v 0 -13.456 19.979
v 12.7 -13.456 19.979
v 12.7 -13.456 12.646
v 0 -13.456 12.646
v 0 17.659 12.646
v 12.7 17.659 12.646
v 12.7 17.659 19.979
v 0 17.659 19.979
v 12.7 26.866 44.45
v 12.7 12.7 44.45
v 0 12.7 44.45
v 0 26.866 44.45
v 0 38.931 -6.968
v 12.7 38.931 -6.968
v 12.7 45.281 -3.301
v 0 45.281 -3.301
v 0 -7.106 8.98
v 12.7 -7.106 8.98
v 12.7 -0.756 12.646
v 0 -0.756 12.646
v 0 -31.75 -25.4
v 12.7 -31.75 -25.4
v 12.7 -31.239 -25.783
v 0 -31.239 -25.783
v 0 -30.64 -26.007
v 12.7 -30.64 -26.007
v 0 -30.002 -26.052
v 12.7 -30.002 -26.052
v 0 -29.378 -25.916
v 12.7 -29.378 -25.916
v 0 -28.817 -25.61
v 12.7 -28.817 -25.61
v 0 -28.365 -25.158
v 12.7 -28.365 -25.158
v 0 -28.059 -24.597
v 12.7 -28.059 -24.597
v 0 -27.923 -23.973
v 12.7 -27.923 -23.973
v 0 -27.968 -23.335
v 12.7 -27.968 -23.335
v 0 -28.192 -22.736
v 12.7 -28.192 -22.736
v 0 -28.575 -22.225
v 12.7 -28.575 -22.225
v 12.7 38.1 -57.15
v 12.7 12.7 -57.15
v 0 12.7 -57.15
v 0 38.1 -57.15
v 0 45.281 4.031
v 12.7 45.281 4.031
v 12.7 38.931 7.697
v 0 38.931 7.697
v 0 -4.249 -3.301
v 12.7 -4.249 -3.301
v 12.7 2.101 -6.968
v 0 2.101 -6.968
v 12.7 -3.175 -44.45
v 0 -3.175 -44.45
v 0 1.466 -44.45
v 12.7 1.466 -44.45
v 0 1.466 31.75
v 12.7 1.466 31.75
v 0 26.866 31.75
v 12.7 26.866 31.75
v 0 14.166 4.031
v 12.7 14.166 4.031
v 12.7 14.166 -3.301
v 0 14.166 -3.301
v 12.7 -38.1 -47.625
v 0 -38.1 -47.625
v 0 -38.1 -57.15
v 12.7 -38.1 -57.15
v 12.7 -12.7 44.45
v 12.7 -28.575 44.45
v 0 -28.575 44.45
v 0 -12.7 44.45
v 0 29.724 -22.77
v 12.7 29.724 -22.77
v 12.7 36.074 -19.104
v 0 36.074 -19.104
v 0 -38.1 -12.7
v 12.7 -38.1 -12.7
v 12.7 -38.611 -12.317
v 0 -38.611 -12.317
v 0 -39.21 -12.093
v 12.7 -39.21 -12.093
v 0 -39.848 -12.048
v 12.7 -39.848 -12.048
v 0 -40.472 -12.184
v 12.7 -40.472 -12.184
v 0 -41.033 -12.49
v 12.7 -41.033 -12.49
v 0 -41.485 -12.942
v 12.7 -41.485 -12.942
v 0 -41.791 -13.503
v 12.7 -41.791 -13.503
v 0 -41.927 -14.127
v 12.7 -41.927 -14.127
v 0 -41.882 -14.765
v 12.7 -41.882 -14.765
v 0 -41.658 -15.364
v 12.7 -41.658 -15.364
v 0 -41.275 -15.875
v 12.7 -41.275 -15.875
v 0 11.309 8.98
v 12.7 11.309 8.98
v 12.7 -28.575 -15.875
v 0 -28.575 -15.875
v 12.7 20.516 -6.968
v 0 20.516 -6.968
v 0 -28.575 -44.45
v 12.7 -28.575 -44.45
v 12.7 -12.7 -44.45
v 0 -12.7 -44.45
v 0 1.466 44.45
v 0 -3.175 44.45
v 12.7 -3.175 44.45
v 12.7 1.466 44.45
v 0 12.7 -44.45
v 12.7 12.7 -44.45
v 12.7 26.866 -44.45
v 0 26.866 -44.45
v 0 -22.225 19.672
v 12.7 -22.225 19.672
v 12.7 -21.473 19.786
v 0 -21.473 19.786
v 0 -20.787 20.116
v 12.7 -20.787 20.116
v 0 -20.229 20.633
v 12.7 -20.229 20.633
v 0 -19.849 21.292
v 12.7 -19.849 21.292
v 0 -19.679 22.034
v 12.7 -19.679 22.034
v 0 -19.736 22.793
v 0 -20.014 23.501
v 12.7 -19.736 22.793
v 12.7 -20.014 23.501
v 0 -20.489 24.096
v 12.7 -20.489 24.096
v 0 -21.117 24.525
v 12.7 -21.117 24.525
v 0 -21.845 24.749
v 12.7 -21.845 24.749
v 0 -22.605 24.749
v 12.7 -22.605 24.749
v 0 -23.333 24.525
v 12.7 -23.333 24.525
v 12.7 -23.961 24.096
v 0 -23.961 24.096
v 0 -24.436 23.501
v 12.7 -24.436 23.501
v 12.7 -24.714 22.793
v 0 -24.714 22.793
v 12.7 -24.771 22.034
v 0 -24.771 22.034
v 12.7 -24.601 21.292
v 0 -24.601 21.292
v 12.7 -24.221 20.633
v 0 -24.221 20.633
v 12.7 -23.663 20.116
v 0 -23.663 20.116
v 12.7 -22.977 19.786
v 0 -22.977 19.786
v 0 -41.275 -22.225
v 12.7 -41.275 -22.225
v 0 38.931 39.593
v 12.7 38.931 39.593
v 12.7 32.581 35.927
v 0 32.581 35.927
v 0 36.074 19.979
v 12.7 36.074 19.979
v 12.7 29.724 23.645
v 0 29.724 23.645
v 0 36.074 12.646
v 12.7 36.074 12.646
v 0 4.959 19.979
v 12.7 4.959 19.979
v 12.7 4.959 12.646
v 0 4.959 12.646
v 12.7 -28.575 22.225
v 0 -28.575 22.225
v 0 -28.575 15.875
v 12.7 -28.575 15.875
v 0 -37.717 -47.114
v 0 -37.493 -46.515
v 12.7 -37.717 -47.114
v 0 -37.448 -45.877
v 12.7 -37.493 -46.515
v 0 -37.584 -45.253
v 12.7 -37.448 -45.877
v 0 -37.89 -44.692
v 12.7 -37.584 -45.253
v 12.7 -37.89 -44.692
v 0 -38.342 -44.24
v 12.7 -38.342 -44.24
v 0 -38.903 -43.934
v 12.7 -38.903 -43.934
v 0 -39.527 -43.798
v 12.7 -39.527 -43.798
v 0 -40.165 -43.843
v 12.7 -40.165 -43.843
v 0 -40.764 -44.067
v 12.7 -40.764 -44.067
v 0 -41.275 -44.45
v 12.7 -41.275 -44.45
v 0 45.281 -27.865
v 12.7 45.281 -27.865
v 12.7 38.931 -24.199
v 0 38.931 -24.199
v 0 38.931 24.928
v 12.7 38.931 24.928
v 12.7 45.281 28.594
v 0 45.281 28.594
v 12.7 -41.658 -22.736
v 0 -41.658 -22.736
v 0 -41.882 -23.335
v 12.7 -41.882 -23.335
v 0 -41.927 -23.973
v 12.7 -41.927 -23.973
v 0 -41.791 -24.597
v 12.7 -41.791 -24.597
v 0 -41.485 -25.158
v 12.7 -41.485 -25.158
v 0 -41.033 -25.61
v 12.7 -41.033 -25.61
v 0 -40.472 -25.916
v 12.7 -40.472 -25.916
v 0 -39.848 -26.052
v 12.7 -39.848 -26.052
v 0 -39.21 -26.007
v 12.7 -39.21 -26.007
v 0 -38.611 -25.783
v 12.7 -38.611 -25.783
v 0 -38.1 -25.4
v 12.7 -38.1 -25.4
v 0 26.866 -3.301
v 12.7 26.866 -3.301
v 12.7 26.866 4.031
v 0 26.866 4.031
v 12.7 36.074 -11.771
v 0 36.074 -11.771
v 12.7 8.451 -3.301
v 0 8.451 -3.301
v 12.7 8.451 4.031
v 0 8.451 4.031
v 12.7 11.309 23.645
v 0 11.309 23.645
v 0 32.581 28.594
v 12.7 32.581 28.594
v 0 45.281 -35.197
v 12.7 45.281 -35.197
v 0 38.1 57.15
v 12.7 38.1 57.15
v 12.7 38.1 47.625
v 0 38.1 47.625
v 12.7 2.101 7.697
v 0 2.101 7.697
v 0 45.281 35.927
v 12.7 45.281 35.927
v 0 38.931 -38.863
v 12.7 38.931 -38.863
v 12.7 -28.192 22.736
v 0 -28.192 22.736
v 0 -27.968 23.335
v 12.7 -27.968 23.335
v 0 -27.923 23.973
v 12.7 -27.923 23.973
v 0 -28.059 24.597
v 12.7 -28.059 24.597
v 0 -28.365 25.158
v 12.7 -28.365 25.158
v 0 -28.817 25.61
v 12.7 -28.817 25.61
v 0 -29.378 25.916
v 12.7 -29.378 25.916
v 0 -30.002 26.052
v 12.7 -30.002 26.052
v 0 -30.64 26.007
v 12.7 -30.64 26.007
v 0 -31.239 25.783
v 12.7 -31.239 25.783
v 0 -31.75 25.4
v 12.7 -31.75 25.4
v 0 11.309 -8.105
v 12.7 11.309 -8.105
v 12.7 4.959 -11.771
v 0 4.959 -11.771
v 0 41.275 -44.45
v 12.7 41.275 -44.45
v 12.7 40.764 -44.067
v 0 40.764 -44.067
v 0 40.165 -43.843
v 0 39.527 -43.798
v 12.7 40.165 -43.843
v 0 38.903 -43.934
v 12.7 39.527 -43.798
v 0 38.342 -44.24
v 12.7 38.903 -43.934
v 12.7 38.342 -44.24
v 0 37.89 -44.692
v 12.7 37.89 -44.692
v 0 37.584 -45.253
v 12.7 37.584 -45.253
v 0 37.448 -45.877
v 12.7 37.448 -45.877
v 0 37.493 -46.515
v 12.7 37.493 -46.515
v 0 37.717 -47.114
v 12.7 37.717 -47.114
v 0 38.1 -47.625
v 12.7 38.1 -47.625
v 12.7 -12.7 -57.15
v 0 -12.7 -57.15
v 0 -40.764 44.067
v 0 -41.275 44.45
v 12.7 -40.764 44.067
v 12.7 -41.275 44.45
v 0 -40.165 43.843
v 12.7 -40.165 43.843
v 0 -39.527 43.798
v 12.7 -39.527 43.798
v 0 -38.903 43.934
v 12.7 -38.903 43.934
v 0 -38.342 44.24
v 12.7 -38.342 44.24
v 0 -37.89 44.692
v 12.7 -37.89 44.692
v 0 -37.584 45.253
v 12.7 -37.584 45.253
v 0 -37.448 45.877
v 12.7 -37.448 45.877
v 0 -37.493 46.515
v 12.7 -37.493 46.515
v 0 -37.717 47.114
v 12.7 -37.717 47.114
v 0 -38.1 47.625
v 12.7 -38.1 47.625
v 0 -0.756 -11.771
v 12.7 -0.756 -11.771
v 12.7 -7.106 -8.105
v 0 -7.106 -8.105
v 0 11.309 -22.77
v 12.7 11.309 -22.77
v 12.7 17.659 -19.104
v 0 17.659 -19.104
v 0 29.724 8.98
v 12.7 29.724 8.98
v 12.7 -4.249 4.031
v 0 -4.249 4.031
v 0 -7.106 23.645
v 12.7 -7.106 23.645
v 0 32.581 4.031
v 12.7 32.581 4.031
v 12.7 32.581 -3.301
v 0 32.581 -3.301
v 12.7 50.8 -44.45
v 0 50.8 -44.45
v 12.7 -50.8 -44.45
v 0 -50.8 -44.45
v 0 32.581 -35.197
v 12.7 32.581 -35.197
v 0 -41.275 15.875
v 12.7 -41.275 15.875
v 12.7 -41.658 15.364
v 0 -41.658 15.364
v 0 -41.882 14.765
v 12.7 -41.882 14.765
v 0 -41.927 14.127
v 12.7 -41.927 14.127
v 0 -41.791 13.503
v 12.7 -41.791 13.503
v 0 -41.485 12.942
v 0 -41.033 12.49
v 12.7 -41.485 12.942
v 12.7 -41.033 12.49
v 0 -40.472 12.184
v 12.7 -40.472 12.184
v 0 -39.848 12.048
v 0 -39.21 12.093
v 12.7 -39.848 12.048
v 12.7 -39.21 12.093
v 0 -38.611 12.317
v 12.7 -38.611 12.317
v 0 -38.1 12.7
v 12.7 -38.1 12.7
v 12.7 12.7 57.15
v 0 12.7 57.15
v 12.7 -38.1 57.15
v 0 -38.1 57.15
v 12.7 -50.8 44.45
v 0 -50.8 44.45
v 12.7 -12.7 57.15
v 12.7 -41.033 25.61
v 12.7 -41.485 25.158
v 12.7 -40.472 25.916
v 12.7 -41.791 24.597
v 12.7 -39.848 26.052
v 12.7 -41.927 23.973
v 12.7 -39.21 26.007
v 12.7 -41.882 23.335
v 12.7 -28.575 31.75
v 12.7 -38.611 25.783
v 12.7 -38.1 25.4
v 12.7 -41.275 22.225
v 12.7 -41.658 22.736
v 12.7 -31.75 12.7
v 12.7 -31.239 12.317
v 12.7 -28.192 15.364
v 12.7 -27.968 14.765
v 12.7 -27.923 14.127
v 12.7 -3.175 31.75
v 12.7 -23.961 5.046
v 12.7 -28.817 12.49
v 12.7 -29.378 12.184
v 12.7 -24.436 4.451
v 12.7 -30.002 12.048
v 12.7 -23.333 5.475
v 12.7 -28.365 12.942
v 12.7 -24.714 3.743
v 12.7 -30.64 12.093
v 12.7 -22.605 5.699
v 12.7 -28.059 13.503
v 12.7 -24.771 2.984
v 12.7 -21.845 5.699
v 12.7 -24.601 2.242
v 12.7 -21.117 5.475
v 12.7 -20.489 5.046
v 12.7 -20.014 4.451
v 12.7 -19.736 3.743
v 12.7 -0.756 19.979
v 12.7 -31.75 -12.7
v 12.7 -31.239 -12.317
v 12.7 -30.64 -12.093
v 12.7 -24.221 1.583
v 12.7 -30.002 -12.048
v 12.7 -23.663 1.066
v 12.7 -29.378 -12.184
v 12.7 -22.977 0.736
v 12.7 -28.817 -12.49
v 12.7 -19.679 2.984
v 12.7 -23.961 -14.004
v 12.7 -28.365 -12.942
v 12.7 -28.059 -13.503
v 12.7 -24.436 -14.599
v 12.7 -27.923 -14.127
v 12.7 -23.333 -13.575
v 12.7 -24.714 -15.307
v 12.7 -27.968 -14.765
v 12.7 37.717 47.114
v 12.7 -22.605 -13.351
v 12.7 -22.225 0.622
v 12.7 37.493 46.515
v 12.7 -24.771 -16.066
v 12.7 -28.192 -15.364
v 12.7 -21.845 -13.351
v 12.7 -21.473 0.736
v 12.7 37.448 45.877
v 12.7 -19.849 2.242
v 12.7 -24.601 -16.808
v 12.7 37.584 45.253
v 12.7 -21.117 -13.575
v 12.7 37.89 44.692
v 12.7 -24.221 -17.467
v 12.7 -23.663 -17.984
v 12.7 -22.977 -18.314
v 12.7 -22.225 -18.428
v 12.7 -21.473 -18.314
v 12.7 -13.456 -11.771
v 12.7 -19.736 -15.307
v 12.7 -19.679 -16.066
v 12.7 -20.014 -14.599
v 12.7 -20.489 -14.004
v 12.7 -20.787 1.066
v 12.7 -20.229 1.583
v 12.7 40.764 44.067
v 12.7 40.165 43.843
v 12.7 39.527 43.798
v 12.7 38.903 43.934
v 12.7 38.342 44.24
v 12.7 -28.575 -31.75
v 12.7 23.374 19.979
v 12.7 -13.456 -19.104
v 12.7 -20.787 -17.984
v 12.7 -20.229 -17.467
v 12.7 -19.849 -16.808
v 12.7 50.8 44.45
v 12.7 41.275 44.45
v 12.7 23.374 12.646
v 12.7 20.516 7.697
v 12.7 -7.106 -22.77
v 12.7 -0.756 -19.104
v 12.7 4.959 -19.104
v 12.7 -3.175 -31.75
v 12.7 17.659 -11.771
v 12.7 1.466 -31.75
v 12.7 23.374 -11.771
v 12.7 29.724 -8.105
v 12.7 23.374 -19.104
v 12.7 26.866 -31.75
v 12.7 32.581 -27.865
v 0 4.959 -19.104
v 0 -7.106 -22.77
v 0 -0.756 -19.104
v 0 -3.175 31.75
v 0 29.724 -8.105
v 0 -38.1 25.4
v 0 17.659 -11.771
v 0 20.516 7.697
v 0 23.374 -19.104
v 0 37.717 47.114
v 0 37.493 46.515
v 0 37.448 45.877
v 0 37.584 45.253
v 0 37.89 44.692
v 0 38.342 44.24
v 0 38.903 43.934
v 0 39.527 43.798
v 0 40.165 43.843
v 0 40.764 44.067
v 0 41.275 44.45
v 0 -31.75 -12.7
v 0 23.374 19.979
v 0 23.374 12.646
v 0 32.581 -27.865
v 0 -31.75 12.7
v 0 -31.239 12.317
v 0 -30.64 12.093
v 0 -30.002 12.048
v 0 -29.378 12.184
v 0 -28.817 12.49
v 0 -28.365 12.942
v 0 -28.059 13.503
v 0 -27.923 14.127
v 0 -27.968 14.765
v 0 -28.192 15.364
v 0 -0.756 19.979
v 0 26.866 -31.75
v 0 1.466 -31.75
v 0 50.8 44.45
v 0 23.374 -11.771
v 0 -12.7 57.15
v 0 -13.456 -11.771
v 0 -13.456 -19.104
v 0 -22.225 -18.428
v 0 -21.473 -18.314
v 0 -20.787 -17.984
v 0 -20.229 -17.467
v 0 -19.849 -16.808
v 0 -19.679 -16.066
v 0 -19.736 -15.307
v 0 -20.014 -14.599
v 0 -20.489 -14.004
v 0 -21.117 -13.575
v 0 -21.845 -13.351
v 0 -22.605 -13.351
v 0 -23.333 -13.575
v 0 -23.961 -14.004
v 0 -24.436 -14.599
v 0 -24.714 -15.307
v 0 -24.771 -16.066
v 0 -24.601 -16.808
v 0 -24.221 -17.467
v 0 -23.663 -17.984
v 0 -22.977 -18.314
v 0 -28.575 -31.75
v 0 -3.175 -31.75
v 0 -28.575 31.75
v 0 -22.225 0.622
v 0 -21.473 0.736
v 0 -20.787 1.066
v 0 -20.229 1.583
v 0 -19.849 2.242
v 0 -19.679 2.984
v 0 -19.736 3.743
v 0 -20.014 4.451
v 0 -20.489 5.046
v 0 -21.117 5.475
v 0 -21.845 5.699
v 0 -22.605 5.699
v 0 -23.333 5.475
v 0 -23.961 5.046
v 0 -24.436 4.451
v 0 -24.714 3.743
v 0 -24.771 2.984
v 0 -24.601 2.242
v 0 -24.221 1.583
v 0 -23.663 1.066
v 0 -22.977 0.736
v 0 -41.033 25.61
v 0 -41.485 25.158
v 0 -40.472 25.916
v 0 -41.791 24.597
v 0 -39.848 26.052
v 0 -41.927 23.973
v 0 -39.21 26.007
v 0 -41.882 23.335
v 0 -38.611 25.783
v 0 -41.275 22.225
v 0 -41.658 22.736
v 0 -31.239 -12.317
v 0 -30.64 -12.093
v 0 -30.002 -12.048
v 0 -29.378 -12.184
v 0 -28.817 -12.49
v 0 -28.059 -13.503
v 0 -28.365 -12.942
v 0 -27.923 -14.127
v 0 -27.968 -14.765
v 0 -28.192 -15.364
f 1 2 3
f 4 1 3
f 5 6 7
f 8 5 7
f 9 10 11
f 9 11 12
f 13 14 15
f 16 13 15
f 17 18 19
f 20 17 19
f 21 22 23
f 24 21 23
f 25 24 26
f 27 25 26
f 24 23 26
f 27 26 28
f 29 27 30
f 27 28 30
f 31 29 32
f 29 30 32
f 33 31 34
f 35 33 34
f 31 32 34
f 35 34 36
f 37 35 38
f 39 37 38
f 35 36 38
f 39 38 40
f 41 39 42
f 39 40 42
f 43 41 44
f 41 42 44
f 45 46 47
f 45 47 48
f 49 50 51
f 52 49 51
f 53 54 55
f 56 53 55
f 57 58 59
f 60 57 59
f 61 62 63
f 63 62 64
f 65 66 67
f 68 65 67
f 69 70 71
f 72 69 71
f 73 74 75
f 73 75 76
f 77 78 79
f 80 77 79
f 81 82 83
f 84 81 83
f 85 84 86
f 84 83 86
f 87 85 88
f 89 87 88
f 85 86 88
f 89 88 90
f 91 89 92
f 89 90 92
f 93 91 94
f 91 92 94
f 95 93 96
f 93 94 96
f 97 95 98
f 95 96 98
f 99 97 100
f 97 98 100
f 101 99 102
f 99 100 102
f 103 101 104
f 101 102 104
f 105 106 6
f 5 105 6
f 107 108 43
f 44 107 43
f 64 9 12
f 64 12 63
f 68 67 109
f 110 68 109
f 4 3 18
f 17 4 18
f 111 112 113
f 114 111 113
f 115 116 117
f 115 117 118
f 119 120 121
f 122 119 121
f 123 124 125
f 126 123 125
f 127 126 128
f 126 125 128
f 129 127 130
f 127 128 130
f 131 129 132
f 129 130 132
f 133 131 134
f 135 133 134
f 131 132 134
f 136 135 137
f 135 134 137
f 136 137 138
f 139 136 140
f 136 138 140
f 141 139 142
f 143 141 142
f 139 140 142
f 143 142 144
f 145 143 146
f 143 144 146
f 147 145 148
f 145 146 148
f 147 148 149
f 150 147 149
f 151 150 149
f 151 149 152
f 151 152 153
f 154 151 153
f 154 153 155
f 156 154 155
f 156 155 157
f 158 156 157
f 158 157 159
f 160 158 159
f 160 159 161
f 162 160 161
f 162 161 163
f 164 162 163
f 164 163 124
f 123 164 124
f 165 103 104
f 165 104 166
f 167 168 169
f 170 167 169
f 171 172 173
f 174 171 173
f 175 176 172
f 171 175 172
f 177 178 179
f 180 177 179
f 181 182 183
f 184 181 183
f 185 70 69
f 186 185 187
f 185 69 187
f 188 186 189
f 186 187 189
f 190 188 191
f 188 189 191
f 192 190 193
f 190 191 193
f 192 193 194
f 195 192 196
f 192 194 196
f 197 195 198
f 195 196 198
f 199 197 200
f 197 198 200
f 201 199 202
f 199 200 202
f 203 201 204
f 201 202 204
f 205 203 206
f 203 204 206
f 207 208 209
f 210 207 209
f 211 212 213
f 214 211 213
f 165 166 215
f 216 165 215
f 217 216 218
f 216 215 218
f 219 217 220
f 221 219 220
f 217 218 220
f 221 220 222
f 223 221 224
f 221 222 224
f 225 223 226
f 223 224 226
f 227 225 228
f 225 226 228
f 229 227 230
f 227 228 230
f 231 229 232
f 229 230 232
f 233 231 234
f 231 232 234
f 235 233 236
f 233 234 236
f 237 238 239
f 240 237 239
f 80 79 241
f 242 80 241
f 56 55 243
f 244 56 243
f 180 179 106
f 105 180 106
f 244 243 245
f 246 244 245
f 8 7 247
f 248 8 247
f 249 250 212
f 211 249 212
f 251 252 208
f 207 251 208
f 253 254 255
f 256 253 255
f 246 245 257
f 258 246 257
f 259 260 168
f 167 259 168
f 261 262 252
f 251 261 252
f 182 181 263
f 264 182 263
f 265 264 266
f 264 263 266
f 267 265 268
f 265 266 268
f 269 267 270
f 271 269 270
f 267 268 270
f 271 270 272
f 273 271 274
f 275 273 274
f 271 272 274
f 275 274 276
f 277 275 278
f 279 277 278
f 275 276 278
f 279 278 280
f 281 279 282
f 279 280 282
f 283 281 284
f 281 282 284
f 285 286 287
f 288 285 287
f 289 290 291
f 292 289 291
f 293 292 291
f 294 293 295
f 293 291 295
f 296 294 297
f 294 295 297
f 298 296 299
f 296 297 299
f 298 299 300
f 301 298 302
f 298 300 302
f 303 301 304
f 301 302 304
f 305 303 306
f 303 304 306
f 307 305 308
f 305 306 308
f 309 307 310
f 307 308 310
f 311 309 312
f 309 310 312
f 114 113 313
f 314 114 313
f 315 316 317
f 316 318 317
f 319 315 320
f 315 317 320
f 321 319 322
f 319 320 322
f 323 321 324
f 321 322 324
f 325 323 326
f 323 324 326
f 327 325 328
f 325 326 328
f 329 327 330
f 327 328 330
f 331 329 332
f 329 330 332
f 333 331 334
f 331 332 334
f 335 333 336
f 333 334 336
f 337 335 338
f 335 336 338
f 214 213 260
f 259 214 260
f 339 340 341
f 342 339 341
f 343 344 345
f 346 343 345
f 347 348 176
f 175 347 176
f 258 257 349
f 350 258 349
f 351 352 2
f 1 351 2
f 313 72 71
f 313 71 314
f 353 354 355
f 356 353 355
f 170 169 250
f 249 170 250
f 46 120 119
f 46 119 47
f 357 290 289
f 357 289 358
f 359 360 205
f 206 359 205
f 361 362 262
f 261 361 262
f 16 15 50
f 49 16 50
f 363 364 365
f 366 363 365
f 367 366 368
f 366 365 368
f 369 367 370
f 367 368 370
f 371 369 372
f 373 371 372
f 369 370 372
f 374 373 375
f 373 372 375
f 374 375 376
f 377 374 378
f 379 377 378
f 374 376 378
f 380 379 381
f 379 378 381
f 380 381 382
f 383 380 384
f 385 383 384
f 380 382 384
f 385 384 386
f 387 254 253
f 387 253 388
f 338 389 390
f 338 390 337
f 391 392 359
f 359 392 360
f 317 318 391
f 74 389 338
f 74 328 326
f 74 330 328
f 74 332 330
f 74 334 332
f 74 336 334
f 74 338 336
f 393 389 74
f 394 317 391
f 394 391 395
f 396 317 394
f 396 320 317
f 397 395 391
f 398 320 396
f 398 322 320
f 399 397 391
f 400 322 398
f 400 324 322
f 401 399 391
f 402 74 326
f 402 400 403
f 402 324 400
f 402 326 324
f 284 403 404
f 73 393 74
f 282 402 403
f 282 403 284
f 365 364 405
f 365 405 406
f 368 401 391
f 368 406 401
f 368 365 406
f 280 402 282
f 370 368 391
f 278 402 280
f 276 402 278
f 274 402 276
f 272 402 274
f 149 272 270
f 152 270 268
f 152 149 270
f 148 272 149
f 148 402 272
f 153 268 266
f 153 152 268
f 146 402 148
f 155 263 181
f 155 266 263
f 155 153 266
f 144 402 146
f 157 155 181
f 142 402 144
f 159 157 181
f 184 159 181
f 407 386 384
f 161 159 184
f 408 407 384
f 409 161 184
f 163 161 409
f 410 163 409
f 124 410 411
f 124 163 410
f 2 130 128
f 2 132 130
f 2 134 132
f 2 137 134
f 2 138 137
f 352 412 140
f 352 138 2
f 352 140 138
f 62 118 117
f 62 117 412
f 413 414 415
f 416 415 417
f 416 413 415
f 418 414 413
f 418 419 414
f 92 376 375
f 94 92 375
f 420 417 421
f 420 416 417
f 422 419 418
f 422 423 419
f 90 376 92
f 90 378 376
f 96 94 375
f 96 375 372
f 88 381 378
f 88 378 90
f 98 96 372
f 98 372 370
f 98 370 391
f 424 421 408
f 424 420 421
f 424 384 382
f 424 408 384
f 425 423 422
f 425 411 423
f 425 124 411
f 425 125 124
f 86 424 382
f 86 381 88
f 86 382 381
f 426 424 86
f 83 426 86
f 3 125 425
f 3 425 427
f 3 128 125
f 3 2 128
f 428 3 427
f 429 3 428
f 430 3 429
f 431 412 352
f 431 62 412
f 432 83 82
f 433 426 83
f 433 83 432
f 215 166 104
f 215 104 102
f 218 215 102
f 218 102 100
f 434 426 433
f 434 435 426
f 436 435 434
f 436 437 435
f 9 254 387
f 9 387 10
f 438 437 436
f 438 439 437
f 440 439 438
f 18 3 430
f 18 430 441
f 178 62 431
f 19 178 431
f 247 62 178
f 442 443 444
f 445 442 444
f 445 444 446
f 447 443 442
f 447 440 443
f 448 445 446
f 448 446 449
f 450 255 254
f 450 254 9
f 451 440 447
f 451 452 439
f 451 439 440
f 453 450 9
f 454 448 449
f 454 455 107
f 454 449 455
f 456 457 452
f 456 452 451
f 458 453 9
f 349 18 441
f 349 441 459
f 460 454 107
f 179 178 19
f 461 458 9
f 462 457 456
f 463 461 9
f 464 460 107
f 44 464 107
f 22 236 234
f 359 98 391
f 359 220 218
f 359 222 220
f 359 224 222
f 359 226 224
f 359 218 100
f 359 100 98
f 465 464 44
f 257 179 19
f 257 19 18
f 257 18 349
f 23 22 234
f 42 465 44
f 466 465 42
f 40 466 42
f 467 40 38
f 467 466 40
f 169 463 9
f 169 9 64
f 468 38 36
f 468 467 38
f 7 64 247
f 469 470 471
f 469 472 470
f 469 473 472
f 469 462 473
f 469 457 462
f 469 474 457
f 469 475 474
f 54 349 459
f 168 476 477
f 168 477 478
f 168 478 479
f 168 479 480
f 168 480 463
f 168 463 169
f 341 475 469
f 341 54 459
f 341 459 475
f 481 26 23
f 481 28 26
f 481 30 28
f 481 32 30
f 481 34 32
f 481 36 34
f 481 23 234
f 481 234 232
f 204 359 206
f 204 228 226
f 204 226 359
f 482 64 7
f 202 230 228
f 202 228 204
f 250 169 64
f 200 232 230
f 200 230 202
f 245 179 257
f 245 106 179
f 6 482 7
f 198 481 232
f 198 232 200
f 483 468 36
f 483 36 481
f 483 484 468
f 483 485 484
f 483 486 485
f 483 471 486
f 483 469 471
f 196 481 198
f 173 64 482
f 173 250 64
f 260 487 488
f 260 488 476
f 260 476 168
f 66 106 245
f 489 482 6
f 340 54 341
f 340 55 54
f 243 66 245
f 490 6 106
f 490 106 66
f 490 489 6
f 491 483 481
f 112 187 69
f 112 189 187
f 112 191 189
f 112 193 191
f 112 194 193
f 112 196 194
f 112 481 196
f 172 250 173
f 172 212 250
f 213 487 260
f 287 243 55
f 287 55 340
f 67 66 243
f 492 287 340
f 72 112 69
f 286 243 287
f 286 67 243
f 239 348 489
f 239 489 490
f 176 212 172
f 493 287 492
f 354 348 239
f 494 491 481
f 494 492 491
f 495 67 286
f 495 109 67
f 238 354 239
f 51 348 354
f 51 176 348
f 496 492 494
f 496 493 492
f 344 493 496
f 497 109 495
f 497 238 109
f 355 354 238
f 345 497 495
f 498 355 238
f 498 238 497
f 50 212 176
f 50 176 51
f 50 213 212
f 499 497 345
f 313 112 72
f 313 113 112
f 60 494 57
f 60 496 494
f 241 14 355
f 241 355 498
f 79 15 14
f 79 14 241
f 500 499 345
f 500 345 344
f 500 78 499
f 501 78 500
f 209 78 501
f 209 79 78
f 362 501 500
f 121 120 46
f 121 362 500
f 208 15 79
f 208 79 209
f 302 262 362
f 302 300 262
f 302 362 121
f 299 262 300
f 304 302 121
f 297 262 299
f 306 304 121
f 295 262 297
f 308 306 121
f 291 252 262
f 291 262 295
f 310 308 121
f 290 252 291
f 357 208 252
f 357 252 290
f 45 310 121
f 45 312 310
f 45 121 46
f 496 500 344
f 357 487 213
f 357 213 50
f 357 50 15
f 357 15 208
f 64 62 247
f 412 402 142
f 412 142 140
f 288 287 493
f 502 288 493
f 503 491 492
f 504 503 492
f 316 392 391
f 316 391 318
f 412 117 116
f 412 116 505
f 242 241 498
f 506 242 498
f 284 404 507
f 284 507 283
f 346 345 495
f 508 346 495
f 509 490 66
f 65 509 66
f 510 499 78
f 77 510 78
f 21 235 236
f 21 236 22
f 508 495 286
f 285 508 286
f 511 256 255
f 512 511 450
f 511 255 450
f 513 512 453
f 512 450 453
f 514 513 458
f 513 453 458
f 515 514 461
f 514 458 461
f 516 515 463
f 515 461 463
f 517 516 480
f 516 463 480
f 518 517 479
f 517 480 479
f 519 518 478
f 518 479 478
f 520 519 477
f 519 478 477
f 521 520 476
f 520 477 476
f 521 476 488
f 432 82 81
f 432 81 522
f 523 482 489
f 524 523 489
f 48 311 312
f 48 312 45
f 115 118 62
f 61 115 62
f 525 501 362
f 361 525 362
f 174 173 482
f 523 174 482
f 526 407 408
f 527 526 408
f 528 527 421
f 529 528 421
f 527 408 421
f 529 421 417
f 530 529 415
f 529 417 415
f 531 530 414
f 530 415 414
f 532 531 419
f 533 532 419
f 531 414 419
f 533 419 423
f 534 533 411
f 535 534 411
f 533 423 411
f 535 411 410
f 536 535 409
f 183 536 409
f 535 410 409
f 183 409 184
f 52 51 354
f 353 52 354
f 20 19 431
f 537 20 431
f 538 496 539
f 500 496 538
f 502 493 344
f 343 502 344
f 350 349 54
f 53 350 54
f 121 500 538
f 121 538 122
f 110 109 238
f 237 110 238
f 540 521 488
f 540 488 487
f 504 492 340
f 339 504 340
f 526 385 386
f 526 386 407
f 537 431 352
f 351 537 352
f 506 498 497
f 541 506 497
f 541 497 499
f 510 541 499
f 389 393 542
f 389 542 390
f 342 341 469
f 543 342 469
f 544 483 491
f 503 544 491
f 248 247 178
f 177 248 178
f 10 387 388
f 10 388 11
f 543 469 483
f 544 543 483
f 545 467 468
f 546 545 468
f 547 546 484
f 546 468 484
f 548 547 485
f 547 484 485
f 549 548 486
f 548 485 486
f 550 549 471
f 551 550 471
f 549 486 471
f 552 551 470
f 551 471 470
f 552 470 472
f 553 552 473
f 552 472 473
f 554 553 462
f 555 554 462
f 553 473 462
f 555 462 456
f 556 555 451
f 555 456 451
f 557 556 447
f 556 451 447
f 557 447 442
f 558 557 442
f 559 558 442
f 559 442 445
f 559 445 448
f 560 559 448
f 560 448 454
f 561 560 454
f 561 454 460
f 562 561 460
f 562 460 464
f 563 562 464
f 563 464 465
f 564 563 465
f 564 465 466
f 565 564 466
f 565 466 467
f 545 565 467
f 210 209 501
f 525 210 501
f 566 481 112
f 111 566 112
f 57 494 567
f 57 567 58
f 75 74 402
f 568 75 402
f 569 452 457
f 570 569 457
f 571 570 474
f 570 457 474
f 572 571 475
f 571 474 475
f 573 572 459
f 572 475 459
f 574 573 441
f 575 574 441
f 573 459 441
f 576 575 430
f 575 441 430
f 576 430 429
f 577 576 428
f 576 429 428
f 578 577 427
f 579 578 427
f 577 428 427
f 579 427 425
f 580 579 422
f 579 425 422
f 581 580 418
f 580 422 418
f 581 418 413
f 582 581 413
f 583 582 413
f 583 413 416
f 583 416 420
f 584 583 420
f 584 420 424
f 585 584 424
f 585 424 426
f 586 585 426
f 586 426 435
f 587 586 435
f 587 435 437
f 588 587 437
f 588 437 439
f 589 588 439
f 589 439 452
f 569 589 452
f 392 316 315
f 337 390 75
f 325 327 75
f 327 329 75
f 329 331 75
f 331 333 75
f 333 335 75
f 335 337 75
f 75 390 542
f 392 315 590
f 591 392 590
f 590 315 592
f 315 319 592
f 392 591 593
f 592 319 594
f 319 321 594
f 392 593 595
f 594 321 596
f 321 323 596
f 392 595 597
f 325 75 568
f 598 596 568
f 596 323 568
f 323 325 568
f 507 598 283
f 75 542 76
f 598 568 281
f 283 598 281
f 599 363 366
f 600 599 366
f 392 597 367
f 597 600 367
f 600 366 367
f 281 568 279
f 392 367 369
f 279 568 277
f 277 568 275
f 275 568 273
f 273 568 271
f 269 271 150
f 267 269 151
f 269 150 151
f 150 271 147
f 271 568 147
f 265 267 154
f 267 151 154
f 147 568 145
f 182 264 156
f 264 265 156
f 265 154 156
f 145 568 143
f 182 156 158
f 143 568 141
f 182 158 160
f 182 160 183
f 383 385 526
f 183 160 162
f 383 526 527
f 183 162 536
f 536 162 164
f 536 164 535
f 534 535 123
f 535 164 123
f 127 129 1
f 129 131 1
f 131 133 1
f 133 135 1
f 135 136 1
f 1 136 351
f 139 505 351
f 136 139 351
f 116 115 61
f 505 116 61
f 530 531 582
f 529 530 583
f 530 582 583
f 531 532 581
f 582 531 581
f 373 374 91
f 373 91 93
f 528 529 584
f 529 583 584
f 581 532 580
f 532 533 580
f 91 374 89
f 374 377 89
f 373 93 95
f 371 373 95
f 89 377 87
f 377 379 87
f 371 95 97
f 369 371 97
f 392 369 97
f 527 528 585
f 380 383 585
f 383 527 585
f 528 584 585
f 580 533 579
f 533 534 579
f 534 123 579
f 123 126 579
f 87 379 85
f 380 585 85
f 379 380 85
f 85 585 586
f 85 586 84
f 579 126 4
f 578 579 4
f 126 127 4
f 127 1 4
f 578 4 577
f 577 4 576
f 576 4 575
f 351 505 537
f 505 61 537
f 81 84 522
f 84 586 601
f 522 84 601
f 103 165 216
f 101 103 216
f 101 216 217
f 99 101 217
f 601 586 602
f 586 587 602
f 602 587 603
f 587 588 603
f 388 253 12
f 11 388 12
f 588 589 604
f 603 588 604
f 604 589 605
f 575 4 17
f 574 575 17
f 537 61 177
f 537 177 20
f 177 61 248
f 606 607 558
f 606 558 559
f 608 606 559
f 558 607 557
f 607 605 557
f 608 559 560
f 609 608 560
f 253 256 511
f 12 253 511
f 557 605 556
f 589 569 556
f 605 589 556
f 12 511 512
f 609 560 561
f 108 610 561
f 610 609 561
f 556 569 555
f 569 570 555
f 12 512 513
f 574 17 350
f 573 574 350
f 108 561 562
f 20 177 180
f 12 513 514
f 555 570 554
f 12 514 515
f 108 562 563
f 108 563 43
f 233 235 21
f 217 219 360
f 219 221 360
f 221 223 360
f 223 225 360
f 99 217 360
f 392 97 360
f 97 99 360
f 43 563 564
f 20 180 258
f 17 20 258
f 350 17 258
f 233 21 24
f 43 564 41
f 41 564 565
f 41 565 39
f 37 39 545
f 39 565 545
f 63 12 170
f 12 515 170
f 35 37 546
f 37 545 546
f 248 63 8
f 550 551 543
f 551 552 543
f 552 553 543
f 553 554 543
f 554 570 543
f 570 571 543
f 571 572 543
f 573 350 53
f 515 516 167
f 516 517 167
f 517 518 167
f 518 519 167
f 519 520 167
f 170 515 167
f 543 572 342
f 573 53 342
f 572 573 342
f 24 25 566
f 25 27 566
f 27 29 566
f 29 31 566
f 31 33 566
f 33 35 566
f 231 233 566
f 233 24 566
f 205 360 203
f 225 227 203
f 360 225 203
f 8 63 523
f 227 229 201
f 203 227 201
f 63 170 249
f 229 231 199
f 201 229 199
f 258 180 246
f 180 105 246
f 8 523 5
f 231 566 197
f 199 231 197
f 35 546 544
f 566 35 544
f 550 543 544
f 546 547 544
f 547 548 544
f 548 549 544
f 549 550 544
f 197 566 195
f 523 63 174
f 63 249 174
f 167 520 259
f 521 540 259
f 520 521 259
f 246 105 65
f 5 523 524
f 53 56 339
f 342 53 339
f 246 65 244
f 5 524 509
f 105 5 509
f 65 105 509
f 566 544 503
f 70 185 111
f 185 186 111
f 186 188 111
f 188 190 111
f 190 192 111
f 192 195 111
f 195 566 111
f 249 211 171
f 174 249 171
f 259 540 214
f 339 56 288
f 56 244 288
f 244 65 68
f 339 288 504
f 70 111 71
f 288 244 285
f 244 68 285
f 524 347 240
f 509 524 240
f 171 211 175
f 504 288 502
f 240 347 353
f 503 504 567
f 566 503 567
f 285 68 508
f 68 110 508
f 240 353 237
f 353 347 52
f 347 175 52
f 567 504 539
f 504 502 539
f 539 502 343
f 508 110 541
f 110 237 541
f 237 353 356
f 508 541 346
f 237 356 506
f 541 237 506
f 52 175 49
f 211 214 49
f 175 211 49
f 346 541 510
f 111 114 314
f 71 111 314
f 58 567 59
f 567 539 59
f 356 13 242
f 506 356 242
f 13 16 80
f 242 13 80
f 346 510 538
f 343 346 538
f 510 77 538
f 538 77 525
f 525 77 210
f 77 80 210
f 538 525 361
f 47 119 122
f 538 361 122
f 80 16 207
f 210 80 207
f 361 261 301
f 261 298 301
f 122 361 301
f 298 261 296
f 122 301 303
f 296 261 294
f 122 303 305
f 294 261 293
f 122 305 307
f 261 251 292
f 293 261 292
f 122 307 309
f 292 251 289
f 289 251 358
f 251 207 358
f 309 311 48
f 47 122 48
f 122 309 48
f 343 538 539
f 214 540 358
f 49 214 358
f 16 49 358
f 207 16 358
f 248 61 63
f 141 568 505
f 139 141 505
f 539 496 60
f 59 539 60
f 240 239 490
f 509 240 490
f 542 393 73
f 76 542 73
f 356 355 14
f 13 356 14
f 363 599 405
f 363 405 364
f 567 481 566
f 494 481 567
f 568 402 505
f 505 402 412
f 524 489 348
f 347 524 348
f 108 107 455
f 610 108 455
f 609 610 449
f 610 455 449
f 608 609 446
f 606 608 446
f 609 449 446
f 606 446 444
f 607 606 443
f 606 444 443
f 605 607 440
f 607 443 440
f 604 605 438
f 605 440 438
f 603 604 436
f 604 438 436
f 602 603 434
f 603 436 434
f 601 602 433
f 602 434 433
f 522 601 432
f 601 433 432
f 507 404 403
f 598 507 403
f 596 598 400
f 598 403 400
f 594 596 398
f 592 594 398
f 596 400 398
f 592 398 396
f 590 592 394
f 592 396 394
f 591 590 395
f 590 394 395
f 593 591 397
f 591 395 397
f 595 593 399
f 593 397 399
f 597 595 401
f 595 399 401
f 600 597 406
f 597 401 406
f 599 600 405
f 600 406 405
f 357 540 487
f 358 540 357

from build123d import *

# Parameters (mm, degrees)
SKETCH3_W                 = 88.9
SKETCH3_H                 = 101.6
SQUARE_EXTRUSION_DEPTH    = 12.7
SKETCH4_R                 = 2.24536
SKETCH4_W                 = 12.7
SKETCH4_H                 = 12.7
SLOTTING_HOLES_DEPTH      = 12.7
HONEYCOMB_POCKETING_DEPTH = 12.7
SKETCH10_W                = 12.7
SKETCH10_H                = 12.7
SIDE_SLOTS_DEPTH          = 12.7
SKETCH12_R                = 2.5527
SKETCH12_R_2              = 2.24536
CUT_EXTRUDE1_DEPTH        = 78.51162816
SKETCH14_W                = 12.7
SKETCH14_H                = 25.4
CUT_EXTRUDE4_DEPTH        = 78.51162816


with BuildPart() as part:
    # Sketch3 → Square Extrusion (new body)
    with BuildSketch(Plane(origin=(0, 0, 0), x_dir=(0, 0, -1), z_dir=(1, 0, 0))):
        Rectangle(SKETCH3_W, SKETCH3_H)
    extrude(amount=SQUARE_EXTRUSION_DEPTH)

    # Sketch4 → Slotting Holes (cut)
    with BuildSketch(Plane(origin=(12.7, 0, 0), x_dir=(0, 0, -1), z_dir=(1, 0, 0))):
        with BuildLine():
            ThreePointArc((-22.224581463, -28.575), (-25.400209282, -28.574790718), (-25.4, -31.750418537))
            Line((-25.4, -31.750418537), (-25.4, -28.575))
            Line((-25.4, -28.575), (-22.224581463, -28.575))
        make_face()
        with BuildLine():
            Line((-25.4, -28.575), (-25.4, -31.750418537))
            ThreePointArc((-25.4, -31.750418537), (-22.953101219, -32.236885515), (-21.56714, -30.1625))
            ThreePointArc((-21.56714, -30.1625), (-21.73800123, -29.303374641), (-22.224581463, -28.575))
            Line((-22.224581463, -28.575), (-25.4, -28.575))
        make_face()
        with Locations((-23.8125, -39.6875)):
            Circle(SKETCH4_R)
        with Locations((-14.2875, -39.6875)):
            Circle(SKETCH4_R)
        with Locations((-14.2875, -30.1625)):
            Circle(SKETCH4_R)
        with Locations((-23.8125, -30.1625)):
            Circle(SKETCH4_R)
        with Locations((-19.05, -34.925)):
            Rectangle(SKETCH4_W, SKETCH4_H)
        with BuildLine():
            ThreePointArc((-15.875418537, -28.575), (-15.875209282, -31.750209282), (-12.7, -31.750418537))
            Line((-12.7, -31.750418537), (-12.7, -28.575))
            Line((-12.7, -28.575), (-15.875418537, -28.575))
        make_face()
        with BuildLine():
            Line((-12.7, -28.575), (-12.7, -31.750418537))
            ThreePointArc((-12.7, -31.750418537), (-12.213114485, -31.021898781), (-12.04214, -30.1625))
            ThreePointArc((-12.04214, -30.1625), (-13.428374641, -28.08800123), (-15.875418537, -28.575))
            Line((-15.875418537, -28.575), (-12.7, -28.575))
        make_face()
        with BuildLine():
            Line((-25.4, -38.099581463), (-25.4, -41.275))
            Line((-25.4, -41.275), (-22.224581463, -41.275))
            ThreePointArc((-22.224581463, -41.275), (-21.73800123, -40.546625359), (-21.56714, -39.6875))
            ThreePointArc((-21.56714, -39.6875), (-22.953101219, -37.613114485), (-25.4, -38.099581463))
        make_face()
        with BuildLine():
            Line((-22.224581463, -41.275), (-25.4, -41.275))
            Line((-25.4, -41.275), (-25.4, -38.099581463))
            ThreePointArc((-25.4, -38.099581463), (-25.400209282, -41.275209282), (-22.224581463, -41.275))
        make_face()
        with BuildLine():
            ThreePointArc((-12.7, -38.099581463), (-15.875209282, -38.099790718), (-15.875418537, -41.275))
            Line((-15.875418537, -41.275), (-12.7, -41.275))
            Line((-12.7, -41.275), (-12.7, -38.099581463))
        make_face()
        with BuildLine():
            Line((-12.7, -41.275), (-15.875418537, -41.275))
            ThreePointArc((-15.875418537, -41.275), (-13.428374641, -41.76199877), (-12.04214, -39.6875))
            ThreePointArc((-12.04214, -39.6875), (-12.213114485, -38.828101219), (-12.7, -38.099581463))
            Line((-12.7, -38.099581463), (-12.7, -41.275))
        make_face()
        with BuildLine():
            ThreePointArc((16.53286, -30.1625), (16.36199877, -29.303374641), (15.875418537, -28.575))
            Line((15.875418537, -28.575), (12.7, -28.575))
            Line((12.7, -28.575), (12.7, -31.750418537))
            ThreePointArc((12.7, -31.750418537), (15.146898781, -32.236885515), (16.53286, -30.1625))
        make_face()
        with BuildLine():
            Line((12.7, -28.575), (15.875418537, -28.575))
            ThreePointArc((15.875418537, -28.575), (12.699790718, -28.574790718), (12.7, -31.750418537))
            Line((12.7, -31.750418537), (12.7, -28.575))
        make_face()
        with Locations((23.8125, -30.1625)):
            Circle(SKETCH4_R)
        with Locations((14.2875, -30.1625)):
            Circle(SKETCH4_R)
        with Locations((14.2875, -39.6875)):
            Circle(SKETCH4_R)
        with Locations((23.8125, -39.6875)):
            Circle(SKETCH4_R)
        with Locations((19.05, -34.925)):
            Rectangle(SKETCH4_W, SKETCH4_H)
        with BuildLine():
            Line((25.4, -31.750418537), (25.4, -28.575))
            Line((25.4, -28.575), (22.224581463, -28.575))
            ThreePointArc((22.224581463, -28.575), (22.224790718, -31.750209282), (25.4, -31.750418537))
        make_face()
        with BuildLine():
            Line((22.224581463, -28.575), (25.4, -28.575))
            Line((25.4, -28.575), (25.4, -31.750418537))
            ThreePointArc((25.4, -31.750418537), (25.886885515, -31.021898781), (26.05786, -30.1625))
            ThreePointArc((26.05786, -30.1625), (24.671625359, -28.08800123), (22.224581463, -28.575))
        make_face()
        with BuildLine():
            ThreePointArc((26.05786, -39.6875), (25.886885515, -38.828101219), (25.4, -38.099581463))
            Line((25.4, -38.099581463), (25.4, -41.275))
            Line((25.4, -41.275), (22.224581463, -41.275))
            ThreePointArc((22.224581463, -41.275), (24.671625359, -41.76199877), (26.05786, -39.6875))
        make_face()
        with BuildLine():
            Line((25.4, -41.275), (25.4, -38.099581463))
            ThreePointArc((25.4, -38.099581463), (22.224790718, -38.099790718), (22.224581463, -41.275))
            Line((22.224581463, -41.275), (25.4, -41.275))
        make_face()
        with BuildLine():
            ThreePointArc((16.53286, -39.6875), (15.146898781, -37.613114485), (12.7, -38.099581463))
            Line((12.7, -38.099581463), (12.7, -41.275))
            Line((12.7, -41.275), (15.875418537, -41.275))
            ThreePointArc((15.875418537, -41.275), (16.36199877, -40.546625359), (16.53286, -39.6875))
        make_face()
        with BuildLine():
            Line((12.7, -41.275), (12.7, -38.099581463))
            ThreePointArc((12.7, -38.099581463), (12.699790718, -41.275209282), (15.875418537, -41.275))
            Line((15.875418537, -41.275), (12.7, -41.275))
        make_face()
    extrude(amount=-SLOTTING_HOLES_DEPTH, mode=Mode.SUBTRACT)

    # Sketch9 → Honeycomb Pocketing (cut)
    with BuildSketch(Plane(origin=(12.7, 0, 0), x_dir=(0, 0, -1), z_dir=(1, 0, 0))):
        Polygon((-35.926583558, 32.58118298), (-28.594235139, 32.581185003), (-24.928062682, 38.931186014), (-28.594238643, 45.281185003), (-35.926587062, 45.28118298), (-39.592759519, 38.931181968), align=None)
        Polygon((-4.030867936, 32.58118298), (3.301480483, 32.581185003), (6.96765294, 38.931186014), (3.301476978, 45.281185003), (-4.03087144, 45.28118298), (-7.697043898, 38.931181968), align=None)
        Polygon((27.864847685, 32.58118298), (35.197196104, 32.581185003), (38.863368561, 38.931186014), (35.1971926, 45.281185003), (27.864844181, 45.28118298), (24.198671724, 38.931181968), align=None)
        Polygon((-19.978725747, 23.37368298), (-12.646377328, 23.373685003), (-8.980204871, 29.723686014), (-12.646380832, 36.073685003), (-19.978729251, 36.07368298), (-23.644901708, 29.723681968), align=None)
        Polygon((11.771274253, 23.37368298), (19.103622672, 23.373685003), (22.769795129, 29.723686014), (19.103619168, 36.073685003), (11.771270749, 36.07368298), (8.105098292, 29.723681968), align=None)
        Polygon((-4.030867936, 14.16618298), (3.301480483, 14.166185003), (6.96765294, 20.516186014), (3.301476978, 26.866185003), (-4.03087144, 26.86618298), (-7.697043898, 20.516181968), align=None)
        Polygon((-19.978725747, 4.95868298), (-12.646377328, 4.958685003), (-8.980204871, 11.308686014), (-12.646380832, 17.658685003), (-19.978729251, 17.65868298), (-23.644901708, 11.308681968), align=None)
        Polygon((11.771274253, 4.95868298), (19.103622672, 4.958685003), (22.769795129, 11.308686014), (19.103619168, 17.658685003), (11.771270749, 17.65868298), (8.105098292, 11.308681968), align=None)
        Polygon((-4.030867936, -4.24881702), (3.301480483, -4.248814997), (6.96765294, 2.101186014), (3.301476978, 8.451185003), (-4.03087144, 8.45118298), (-7.697043898, 2.101181968), align=None)
        Polygon((-19.978725747, -13.45631702), (-12.646377328, -13.456314997), (-8.980204871, -7.106313986), (-12.646380832, -0.756314997), (-19.978729251, -0.75631702), (-23.644901708, -7.106318032), align=None)
        Polygon((11.771274253, -13.45631702), (19.103622672, -13.456314997), (22.769795129, -7.106313986), (19.103619168, -0.756314997), (11.771270749, -0.75631702), (8.105098292, -7.106318032), align=None)
    extrude(amount=-HONEYCOMB_POCKETING_DEPTH, mode=Mode.SUBTRACT)

    # Sketch10 → Side Slots (add)
    with BuildSketch(Plane(origin=(12.7, 0, 0), x_dir=(0, 0, -1), z_dir=(1, 0, 0))):
        with Locations((-50.8, 31.75)):
            Rectangle(SKETCH10_W, SKETCH10_H)
        with Locations((-50.8, 19.05)):
            Rectangle(SKETCH10_W, SKETCH10_H)
        with Locations((-50.8, -19.05)):
            Rectangle(SKETCH10_W, SKETCH10_H)
        with Locations((-50.8, -31.75)):
            Rectangle(SKETCH10_W, SKETCH10_H)
        with Locations((50.8, -19.05)):
            Rectangle(SKETCH10_W, SKETCH10_H)
        with Locations((50.8, -31.75)):
            Rectangle(SKETCH10_W, SKETCH10_H)
        with Locations((50.8, 19.05)):
            Rectangle(SKETCH10_W, SKETCH10_H)
        with Locations((50.8, 31.75)):
            Rectangle(SKETCH10_W, SKETCH10_H)
    extrude(amount=-SIDE_SLOTS_DEPTH)

    # Sketch12 → Cut-Extrude1 (cut, through all)
    with BuildSketch(Plane(origin=(12.7, 0, 0), x_dir=(0, 0, -1), z_dir=(1, 0, 0))):
        with Locations((-22.225, -22.225)):
            Circle(SKETCH12_R)
        with Locations((-3.175, -22.225)):
            Circle(SKETCH12_R)
        with Locations((15.875, -22.225)):
            Circle(SKETCH12_R)
        with Locations((-46.0375, 39.6875)):
            Circle(SKETCH12_R_2)
        with Locations((46.0375, 39.6875)):
            Circle(SKETCH12_R_2)
        with Locations((46.0375, -39.6875)):
            Circle(SKETCH12_R_2)
        with Locations((-46.0375, -39.6875)):
            Circle(SKETCH12_R_2)
    extrude(amount=-CUT_EXTRUDE1_DEPTH, mode=Mode.SUBTRACT)

    # Sketch14 → Cut-Extrude4 (cut, through all)
    with BuildSketch(Plane(origin=(12.7, 0, 0), x_dir=(0, 0, -1), z_dir=(1, 0, 0))):
        with Locations((-38.1, -15.875)):
            Rectangle(SKETCH14_W, SKETCH14_H)
        with Locations((-38.1, 14.16618)):
            Rectangle(SKETCH14_W, SKETCH14_H)
        with Locations((38.1, -15.875)):
            Rectangle(SKETCH14_W, SKETCH14_H)
        with Locations((38.1, 14.16618)):
            Rectangle(SKETCH14_W, SKETCH14_H)
    extrude(amount=-CUT_EXTRUDE4_DEPTH, mode=Mode.SUBTRACT)


solid = part.part
